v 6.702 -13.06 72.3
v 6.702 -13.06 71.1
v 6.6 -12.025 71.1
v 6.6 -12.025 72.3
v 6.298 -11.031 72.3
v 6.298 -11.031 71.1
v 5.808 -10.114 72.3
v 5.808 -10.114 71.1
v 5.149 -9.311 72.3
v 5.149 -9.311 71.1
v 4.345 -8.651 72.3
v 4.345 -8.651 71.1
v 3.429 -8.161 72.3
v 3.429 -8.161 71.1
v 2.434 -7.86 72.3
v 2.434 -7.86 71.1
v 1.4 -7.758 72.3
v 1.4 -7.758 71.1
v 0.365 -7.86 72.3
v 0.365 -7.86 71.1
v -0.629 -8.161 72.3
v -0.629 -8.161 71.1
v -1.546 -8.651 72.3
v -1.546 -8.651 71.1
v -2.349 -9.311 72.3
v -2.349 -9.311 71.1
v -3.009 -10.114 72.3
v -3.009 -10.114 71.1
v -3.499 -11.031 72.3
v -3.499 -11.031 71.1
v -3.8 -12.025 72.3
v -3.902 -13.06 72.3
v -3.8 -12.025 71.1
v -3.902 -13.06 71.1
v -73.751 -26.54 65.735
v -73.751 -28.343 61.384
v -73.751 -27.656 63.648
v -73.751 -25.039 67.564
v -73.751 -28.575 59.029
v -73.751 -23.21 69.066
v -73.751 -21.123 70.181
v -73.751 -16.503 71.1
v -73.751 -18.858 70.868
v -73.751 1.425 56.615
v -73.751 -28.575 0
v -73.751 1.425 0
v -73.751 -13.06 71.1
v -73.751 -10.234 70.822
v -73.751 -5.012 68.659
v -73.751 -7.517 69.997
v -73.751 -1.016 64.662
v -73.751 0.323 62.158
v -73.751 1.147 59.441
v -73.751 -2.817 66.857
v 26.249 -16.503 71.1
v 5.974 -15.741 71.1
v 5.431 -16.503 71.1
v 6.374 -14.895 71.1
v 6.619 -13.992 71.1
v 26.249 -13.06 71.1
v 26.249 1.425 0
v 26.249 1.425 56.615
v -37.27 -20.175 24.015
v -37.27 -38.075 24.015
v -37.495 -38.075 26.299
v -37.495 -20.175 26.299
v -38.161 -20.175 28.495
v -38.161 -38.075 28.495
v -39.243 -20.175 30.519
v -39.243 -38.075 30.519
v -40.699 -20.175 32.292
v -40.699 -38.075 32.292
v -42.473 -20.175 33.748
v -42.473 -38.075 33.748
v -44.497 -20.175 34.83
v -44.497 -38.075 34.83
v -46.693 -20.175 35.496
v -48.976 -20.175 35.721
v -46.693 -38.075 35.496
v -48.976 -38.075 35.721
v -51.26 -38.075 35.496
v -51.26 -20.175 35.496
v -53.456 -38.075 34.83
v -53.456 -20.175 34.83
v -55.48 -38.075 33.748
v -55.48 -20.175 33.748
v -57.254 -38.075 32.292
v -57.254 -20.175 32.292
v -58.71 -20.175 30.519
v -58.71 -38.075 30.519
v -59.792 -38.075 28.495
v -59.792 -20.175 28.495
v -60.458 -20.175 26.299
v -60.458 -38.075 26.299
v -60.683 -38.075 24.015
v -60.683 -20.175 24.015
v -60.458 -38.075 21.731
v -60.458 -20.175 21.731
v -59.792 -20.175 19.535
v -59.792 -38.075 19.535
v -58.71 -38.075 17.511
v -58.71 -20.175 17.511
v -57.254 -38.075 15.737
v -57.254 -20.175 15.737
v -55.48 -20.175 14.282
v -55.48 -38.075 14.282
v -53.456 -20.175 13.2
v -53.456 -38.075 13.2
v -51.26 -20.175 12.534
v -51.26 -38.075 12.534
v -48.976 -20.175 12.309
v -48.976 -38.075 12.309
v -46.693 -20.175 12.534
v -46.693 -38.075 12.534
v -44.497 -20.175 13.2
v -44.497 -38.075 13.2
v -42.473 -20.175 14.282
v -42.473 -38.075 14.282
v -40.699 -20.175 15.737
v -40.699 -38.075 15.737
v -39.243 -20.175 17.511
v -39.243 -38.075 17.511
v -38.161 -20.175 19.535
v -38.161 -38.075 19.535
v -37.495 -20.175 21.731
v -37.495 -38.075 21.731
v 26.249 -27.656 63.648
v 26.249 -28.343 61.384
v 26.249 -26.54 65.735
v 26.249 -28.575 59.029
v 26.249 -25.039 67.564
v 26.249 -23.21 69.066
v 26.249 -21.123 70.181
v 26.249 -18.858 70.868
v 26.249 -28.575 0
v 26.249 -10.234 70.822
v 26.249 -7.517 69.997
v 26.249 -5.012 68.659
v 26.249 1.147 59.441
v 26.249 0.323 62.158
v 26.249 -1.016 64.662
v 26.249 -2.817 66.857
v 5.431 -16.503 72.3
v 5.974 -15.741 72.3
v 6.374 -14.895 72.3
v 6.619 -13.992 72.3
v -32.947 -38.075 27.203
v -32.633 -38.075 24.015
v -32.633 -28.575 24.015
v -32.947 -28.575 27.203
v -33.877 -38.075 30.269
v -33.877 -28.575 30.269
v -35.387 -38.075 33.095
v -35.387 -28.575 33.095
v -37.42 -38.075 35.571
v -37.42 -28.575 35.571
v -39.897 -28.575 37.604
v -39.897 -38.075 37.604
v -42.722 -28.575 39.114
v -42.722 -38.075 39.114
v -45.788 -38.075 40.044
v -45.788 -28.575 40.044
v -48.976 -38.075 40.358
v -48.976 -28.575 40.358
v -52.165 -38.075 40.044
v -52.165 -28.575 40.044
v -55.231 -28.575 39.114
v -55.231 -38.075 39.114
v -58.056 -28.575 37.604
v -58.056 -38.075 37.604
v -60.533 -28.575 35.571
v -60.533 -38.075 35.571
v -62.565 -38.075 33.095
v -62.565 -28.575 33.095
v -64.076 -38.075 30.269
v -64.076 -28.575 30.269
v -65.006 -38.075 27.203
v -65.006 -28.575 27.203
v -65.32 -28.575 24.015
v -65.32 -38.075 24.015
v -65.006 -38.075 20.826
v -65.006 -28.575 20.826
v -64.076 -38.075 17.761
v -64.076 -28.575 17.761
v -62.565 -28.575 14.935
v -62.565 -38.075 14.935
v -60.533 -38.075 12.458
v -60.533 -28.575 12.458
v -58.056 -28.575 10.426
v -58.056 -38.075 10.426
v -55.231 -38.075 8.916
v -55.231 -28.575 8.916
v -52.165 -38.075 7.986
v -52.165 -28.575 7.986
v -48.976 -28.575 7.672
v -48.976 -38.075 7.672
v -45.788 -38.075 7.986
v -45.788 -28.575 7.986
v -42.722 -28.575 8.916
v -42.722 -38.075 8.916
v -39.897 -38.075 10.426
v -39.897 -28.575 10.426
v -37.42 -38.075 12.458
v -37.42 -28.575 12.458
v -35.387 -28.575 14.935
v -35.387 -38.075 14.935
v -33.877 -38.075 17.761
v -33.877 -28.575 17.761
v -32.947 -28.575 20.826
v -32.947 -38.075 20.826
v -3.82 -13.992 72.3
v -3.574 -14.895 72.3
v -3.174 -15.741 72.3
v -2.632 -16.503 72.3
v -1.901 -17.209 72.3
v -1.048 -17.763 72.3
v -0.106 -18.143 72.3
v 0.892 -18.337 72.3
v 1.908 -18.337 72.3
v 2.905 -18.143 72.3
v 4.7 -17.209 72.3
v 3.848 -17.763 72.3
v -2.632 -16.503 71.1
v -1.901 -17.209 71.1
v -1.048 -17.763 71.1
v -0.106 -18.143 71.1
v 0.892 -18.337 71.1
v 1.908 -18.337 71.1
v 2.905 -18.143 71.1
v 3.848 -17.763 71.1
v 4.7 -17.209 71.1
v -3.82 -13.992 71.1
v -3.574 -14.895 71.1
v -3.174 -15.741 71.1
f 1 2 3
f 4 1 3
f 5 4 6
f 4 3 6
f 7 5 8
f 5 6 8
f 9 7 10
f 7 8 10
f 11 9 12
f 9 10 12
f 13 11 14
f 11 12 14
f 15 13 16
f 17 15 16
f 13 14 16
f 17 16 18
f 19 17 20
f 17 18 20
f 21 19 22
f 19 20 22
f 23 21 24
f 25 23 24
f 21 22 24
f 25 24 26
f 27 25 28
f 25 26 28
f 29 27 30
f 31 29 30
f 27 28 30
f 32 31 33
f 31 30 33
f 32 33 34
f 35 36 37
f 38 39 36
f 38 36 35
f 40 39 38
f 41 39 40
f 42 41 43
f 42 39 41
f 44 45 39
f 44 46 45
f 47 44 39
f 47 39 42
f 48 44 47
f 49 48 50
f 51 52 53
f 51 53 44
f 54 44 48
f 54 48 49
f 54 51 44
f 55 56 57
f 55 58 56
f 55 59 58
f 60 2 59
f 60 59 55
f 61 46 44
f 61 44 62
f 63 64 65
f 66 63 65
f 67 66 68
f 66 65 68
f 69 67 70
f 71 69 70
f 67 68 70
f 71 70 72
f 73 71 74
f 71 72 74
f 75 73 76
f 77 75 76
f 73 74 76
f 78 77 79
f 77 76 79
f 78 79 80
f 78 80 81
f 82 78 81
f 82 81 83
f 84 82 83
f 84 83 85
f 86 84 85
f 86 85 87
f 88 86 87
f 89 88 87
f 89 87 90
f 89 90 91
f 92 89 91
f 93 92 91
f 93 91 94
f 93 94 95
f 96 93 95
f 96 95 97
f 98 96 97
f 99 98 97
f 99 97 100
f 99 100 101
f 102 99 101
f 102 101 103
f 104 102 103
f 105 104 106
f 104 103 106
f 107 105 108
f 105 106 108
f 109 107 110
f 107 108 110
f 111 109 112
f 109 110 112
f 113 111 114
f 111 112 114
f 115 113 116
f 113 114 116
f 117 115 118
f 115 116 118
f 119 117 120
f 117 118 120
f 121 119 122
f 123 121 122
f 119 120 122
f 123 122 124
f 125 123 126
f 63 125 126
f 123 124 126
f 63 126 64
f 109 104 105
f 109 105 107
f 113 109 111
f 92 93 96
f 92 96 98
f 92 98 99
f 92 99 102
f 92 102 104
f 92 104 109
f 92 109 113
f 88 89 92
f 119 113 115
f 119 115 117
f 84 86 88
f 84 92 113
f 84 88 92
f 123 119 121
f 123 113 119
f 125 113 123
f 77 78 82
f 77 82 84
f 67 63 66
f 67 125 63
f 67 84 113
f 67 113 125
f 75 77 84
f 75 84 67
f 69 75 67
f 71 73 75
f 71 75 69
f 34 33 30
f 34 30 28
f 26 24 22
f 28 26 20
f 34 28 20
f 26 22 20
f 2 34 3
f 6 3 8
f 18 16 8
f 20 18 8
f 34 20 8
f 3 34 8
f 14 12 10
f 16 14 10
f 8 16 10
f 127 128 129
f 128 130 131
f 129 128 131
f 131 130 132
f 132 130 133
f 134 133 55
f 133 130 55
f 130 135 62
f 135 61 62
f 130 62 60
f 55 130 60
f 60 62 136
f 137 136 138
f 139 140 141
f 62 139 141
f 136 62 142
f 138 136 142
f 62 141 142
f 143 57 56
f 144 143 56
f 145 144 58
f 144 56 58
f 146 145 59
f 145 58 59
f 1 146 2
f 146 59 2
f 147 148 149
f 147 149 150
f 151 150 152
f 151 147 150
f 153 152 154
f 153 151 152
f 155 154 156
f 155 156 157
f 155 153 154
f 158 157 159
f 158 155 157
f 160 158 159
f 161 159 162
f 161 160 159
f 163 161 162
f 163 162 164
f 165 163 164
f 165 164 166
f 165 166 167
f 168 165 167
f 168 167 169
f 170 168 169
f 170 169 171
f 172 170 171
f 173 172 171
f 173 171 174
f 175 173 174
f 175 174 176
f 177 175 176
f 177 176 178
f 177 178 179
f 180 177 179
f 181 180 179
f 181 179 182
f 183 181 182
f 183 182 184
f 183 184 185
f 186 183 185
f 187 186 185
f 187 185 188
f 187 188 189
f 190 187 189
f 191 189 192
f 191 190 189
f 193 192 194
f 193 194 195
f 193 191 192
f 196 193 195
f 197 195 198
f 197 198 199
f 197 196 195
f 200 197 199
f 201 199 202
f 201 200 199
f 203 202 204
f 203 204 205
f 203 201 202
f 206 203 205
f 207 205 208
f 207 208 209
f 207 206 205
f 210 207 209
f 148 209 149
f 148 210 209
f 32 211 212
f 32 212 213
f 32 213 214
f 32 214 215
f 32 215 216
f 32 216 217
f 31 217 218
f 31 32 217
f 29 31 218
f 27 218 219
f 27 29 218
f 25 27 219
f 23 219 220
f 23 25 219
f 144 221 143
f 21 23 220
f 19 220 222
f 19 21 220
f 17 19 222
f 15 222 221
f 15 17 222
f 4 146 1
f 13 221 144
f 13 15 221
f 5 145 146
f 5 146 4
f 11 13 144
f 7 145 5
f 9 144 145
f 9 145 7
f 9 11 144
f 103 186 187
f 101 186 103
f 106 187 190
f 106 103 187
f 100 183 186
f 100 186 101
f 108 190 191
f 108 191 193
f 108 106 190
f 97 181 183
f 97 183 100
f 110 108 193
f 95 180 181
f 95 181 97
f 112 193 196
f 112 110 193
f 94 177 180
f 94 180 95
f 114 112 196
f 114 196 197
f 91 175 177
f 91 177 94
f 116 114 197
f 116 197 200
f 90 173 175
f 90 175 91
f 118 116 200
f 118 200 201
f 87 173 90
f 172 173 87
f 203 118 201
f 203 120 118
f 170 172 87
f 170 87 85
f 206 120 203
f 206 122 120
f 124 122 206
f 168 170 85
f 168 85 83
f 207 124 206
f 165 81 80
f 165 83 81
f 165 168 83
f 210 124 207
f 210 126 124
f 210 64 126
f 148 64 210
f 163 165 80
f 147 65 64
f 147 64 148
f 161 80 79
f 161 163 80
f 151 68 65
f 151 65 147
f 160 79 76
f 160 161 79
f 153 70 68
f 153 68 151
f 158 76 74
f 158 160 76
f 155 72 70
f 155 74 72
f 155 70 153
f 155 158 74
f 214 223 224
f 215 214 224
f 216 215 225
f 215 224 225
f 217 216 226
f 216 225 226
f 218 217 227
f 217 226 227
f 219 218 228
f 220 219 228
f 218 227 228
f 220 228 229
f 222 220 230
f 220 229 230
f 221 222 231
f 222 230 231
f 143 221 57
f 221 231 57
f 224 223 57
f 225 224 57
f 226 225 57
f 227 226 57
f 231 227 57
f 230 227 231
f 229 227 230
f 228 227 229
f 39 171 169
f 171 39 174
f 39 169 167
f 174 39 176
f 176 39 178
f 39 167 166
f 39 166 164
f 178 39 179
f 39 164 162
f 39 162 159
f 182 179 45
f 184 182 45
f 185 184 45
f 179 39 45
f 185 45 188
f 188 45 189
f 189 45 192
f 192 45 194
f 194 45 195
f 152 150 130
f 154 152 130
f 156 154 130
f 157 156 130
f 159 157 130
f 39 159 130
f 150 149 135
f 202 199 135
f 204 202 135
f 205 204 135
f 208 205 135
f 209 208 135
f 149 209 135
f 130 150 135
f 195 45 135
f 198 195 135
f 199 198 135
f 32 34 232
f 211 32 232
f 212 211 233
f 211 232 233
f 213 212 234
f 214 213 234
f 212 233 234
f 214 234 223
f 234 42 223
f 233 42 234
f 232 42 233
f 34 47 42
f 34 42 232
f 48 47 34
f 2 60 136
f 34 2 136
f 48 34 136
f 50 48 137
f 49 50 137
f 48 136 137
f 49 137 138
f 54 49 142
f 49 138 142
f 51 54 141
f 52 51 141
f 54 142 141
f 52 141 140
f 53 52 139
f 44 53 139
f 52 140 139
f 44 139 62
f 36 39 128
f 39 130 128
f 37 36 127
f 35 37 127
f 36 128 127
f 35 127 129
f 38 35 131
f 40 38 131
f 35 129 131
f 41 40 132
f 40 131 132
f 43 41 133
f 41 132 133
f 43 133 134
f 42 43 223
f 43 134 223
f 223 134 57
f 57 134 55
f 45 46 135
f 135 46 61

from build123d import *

# Parameters (mm, degrees)
F0_W      = 100
F0_H      = 30
F1_DEPTH  = 71.1
F2_R      = 12.0710678119
F3_R      = 14.4852813742
F4_R      = 16.3433184156
F5_DEPTH  = 14.5
F6_R      = 11.1772790222
F7_DEPTH  = 5.8
F8_R      = 11.70616328
F9_DEPTH  = 7.2
F10_DEPTH = 30.1
F11_DEPTH = 25
F12_DEPTH = 25
F13_DEPTH = 5
F15_DEPTH = 1.2


with BuildPart() as f1:
    # F0 (on Top) → F1 (new body)
    with BuildSketch(Plane.XY):
        with Locations((-23.7509091896, -13.5745047592)):
            Rectangle(F0_W, F0_H)
    extrude(amount=F1_DEPTH)

    # F2
    f2_edges = [f1.edges().sort_by_distance(p)[0] for p in [
        (-23.750909, -28.574505, 71.1),
    ]]
    fillet(f2_edges, radius=F2_R)

    # F3
    f3_edges = [f1.edges().sort_by_distance(p)[0] for p in [
        (-23.750909, 1.425495, 71.1),
    ]]
    fillet(f3_edges, radius=F3_R)

    # F4 (on face) → F5 (join)
    with BuildSketch(Plane.XZ.offset(28.5745047592)):
        with Locations((-48.9764623344, 24.0149181336)):
            Circle(F4_R)
    extrude(amount=F5_DEPTH)

    # F6 (on face) → F7 (join)
    with BuildSketch(Plane.XZ.offset(43.0745047592)):
        with Locations((-48.9764623344, 24.0149181336)):
            Circle(F6_R)
    extrude(amount=-F7_DEPTH)

    # F8 (on face) → F9 (join)
    with BuildSketch(Plane.XZ.offset(43.0745047592)):
        with Locations((-48.9764623344, 24.0149181336)):
            Circle(F8_R)
    extrude(amount=F9_DEPTH)

    # F10 (cut): a face of the model
    f10_faces = [f1.faces().sort_by_distance(p)[0] for p in [
        (-48.9764623344, -50.2745047592, 24.0149181336),
    ]]
    extrude(f10_faces, amount=-F10_DEPTH, mode=Mode.SUBTRACT)

    # F11 (add): a face of the model
    f11_faces = [f1.faces().sort_by_distance(p)[0] for p in [
        (-19.5707016042, -28.5745047592, 30.4258138837),
    ]]
    extrude(f11_faces, amount=F11_DEPTH)

    # F12 (cut): a face of the model
    f12_faces = [f1.faces().sort_by_distance(p)[0] for p in [
        (-19.5707016042, -53.5745047592, 30.4258138837),
    ]]
    extrude(f12_faces, amount=-F12_DEPTH, mode=Mode.SUBTRACT)

    # F13 (cut): a face of the model
    f13_faces = [f1.faces().sort_by_distance(p)[0] for p in [
        (-64.8575218988, -43.0745047592, 24.0149181336),
    ]]
    extrude(f13_faces, amount=-F13_DEPTH, mode=Mode.SUBTRACT)

    # F14 (on face) → F15 (join)
    with BuildSketch(Plane.XY.offset(71.1)):
        with BuildLine():
            ThreePointArc((5.4310929405, -16.5034369473), (6.3738933306, -14.8950718744), (6.7016692178, -13.0597861334))
            Line((6.7016692178, -13.0597861334), (-3.9022553523, -13.0597861334))
            ThreePointArc((-3.9022553523, -13.0597861334), (-3.5744794652, -14.8950718744), (-2.6316790751, -16.5034369473))
            Line((-2.6316790751, -16.5034369473), (5.4310929405, -16.5034369473))
        make_face()
        with BuildLine():
            Line((-3.9022553523, -13.0597861334), (6.7016692178, -13.0597861334))
            ThreePointArc((6.7016692178, -13.0597861334), (1.3997069327, -7.7578238484), (-3.9022553523, -13.0597861334))
        make_face()
        with BuildLine():
            ThreePointArc((-2.6316790751, -16.5034369473), (1.3997069327, -18.3617484184), (5.4310929405, -16.5034369473))
            Line((5.4310929405, -16.5034369473), (-2.6316790751, -16.5034369473))
        make_face()
    extrude(amount=F15_DEPTH)


solid = f1.part
